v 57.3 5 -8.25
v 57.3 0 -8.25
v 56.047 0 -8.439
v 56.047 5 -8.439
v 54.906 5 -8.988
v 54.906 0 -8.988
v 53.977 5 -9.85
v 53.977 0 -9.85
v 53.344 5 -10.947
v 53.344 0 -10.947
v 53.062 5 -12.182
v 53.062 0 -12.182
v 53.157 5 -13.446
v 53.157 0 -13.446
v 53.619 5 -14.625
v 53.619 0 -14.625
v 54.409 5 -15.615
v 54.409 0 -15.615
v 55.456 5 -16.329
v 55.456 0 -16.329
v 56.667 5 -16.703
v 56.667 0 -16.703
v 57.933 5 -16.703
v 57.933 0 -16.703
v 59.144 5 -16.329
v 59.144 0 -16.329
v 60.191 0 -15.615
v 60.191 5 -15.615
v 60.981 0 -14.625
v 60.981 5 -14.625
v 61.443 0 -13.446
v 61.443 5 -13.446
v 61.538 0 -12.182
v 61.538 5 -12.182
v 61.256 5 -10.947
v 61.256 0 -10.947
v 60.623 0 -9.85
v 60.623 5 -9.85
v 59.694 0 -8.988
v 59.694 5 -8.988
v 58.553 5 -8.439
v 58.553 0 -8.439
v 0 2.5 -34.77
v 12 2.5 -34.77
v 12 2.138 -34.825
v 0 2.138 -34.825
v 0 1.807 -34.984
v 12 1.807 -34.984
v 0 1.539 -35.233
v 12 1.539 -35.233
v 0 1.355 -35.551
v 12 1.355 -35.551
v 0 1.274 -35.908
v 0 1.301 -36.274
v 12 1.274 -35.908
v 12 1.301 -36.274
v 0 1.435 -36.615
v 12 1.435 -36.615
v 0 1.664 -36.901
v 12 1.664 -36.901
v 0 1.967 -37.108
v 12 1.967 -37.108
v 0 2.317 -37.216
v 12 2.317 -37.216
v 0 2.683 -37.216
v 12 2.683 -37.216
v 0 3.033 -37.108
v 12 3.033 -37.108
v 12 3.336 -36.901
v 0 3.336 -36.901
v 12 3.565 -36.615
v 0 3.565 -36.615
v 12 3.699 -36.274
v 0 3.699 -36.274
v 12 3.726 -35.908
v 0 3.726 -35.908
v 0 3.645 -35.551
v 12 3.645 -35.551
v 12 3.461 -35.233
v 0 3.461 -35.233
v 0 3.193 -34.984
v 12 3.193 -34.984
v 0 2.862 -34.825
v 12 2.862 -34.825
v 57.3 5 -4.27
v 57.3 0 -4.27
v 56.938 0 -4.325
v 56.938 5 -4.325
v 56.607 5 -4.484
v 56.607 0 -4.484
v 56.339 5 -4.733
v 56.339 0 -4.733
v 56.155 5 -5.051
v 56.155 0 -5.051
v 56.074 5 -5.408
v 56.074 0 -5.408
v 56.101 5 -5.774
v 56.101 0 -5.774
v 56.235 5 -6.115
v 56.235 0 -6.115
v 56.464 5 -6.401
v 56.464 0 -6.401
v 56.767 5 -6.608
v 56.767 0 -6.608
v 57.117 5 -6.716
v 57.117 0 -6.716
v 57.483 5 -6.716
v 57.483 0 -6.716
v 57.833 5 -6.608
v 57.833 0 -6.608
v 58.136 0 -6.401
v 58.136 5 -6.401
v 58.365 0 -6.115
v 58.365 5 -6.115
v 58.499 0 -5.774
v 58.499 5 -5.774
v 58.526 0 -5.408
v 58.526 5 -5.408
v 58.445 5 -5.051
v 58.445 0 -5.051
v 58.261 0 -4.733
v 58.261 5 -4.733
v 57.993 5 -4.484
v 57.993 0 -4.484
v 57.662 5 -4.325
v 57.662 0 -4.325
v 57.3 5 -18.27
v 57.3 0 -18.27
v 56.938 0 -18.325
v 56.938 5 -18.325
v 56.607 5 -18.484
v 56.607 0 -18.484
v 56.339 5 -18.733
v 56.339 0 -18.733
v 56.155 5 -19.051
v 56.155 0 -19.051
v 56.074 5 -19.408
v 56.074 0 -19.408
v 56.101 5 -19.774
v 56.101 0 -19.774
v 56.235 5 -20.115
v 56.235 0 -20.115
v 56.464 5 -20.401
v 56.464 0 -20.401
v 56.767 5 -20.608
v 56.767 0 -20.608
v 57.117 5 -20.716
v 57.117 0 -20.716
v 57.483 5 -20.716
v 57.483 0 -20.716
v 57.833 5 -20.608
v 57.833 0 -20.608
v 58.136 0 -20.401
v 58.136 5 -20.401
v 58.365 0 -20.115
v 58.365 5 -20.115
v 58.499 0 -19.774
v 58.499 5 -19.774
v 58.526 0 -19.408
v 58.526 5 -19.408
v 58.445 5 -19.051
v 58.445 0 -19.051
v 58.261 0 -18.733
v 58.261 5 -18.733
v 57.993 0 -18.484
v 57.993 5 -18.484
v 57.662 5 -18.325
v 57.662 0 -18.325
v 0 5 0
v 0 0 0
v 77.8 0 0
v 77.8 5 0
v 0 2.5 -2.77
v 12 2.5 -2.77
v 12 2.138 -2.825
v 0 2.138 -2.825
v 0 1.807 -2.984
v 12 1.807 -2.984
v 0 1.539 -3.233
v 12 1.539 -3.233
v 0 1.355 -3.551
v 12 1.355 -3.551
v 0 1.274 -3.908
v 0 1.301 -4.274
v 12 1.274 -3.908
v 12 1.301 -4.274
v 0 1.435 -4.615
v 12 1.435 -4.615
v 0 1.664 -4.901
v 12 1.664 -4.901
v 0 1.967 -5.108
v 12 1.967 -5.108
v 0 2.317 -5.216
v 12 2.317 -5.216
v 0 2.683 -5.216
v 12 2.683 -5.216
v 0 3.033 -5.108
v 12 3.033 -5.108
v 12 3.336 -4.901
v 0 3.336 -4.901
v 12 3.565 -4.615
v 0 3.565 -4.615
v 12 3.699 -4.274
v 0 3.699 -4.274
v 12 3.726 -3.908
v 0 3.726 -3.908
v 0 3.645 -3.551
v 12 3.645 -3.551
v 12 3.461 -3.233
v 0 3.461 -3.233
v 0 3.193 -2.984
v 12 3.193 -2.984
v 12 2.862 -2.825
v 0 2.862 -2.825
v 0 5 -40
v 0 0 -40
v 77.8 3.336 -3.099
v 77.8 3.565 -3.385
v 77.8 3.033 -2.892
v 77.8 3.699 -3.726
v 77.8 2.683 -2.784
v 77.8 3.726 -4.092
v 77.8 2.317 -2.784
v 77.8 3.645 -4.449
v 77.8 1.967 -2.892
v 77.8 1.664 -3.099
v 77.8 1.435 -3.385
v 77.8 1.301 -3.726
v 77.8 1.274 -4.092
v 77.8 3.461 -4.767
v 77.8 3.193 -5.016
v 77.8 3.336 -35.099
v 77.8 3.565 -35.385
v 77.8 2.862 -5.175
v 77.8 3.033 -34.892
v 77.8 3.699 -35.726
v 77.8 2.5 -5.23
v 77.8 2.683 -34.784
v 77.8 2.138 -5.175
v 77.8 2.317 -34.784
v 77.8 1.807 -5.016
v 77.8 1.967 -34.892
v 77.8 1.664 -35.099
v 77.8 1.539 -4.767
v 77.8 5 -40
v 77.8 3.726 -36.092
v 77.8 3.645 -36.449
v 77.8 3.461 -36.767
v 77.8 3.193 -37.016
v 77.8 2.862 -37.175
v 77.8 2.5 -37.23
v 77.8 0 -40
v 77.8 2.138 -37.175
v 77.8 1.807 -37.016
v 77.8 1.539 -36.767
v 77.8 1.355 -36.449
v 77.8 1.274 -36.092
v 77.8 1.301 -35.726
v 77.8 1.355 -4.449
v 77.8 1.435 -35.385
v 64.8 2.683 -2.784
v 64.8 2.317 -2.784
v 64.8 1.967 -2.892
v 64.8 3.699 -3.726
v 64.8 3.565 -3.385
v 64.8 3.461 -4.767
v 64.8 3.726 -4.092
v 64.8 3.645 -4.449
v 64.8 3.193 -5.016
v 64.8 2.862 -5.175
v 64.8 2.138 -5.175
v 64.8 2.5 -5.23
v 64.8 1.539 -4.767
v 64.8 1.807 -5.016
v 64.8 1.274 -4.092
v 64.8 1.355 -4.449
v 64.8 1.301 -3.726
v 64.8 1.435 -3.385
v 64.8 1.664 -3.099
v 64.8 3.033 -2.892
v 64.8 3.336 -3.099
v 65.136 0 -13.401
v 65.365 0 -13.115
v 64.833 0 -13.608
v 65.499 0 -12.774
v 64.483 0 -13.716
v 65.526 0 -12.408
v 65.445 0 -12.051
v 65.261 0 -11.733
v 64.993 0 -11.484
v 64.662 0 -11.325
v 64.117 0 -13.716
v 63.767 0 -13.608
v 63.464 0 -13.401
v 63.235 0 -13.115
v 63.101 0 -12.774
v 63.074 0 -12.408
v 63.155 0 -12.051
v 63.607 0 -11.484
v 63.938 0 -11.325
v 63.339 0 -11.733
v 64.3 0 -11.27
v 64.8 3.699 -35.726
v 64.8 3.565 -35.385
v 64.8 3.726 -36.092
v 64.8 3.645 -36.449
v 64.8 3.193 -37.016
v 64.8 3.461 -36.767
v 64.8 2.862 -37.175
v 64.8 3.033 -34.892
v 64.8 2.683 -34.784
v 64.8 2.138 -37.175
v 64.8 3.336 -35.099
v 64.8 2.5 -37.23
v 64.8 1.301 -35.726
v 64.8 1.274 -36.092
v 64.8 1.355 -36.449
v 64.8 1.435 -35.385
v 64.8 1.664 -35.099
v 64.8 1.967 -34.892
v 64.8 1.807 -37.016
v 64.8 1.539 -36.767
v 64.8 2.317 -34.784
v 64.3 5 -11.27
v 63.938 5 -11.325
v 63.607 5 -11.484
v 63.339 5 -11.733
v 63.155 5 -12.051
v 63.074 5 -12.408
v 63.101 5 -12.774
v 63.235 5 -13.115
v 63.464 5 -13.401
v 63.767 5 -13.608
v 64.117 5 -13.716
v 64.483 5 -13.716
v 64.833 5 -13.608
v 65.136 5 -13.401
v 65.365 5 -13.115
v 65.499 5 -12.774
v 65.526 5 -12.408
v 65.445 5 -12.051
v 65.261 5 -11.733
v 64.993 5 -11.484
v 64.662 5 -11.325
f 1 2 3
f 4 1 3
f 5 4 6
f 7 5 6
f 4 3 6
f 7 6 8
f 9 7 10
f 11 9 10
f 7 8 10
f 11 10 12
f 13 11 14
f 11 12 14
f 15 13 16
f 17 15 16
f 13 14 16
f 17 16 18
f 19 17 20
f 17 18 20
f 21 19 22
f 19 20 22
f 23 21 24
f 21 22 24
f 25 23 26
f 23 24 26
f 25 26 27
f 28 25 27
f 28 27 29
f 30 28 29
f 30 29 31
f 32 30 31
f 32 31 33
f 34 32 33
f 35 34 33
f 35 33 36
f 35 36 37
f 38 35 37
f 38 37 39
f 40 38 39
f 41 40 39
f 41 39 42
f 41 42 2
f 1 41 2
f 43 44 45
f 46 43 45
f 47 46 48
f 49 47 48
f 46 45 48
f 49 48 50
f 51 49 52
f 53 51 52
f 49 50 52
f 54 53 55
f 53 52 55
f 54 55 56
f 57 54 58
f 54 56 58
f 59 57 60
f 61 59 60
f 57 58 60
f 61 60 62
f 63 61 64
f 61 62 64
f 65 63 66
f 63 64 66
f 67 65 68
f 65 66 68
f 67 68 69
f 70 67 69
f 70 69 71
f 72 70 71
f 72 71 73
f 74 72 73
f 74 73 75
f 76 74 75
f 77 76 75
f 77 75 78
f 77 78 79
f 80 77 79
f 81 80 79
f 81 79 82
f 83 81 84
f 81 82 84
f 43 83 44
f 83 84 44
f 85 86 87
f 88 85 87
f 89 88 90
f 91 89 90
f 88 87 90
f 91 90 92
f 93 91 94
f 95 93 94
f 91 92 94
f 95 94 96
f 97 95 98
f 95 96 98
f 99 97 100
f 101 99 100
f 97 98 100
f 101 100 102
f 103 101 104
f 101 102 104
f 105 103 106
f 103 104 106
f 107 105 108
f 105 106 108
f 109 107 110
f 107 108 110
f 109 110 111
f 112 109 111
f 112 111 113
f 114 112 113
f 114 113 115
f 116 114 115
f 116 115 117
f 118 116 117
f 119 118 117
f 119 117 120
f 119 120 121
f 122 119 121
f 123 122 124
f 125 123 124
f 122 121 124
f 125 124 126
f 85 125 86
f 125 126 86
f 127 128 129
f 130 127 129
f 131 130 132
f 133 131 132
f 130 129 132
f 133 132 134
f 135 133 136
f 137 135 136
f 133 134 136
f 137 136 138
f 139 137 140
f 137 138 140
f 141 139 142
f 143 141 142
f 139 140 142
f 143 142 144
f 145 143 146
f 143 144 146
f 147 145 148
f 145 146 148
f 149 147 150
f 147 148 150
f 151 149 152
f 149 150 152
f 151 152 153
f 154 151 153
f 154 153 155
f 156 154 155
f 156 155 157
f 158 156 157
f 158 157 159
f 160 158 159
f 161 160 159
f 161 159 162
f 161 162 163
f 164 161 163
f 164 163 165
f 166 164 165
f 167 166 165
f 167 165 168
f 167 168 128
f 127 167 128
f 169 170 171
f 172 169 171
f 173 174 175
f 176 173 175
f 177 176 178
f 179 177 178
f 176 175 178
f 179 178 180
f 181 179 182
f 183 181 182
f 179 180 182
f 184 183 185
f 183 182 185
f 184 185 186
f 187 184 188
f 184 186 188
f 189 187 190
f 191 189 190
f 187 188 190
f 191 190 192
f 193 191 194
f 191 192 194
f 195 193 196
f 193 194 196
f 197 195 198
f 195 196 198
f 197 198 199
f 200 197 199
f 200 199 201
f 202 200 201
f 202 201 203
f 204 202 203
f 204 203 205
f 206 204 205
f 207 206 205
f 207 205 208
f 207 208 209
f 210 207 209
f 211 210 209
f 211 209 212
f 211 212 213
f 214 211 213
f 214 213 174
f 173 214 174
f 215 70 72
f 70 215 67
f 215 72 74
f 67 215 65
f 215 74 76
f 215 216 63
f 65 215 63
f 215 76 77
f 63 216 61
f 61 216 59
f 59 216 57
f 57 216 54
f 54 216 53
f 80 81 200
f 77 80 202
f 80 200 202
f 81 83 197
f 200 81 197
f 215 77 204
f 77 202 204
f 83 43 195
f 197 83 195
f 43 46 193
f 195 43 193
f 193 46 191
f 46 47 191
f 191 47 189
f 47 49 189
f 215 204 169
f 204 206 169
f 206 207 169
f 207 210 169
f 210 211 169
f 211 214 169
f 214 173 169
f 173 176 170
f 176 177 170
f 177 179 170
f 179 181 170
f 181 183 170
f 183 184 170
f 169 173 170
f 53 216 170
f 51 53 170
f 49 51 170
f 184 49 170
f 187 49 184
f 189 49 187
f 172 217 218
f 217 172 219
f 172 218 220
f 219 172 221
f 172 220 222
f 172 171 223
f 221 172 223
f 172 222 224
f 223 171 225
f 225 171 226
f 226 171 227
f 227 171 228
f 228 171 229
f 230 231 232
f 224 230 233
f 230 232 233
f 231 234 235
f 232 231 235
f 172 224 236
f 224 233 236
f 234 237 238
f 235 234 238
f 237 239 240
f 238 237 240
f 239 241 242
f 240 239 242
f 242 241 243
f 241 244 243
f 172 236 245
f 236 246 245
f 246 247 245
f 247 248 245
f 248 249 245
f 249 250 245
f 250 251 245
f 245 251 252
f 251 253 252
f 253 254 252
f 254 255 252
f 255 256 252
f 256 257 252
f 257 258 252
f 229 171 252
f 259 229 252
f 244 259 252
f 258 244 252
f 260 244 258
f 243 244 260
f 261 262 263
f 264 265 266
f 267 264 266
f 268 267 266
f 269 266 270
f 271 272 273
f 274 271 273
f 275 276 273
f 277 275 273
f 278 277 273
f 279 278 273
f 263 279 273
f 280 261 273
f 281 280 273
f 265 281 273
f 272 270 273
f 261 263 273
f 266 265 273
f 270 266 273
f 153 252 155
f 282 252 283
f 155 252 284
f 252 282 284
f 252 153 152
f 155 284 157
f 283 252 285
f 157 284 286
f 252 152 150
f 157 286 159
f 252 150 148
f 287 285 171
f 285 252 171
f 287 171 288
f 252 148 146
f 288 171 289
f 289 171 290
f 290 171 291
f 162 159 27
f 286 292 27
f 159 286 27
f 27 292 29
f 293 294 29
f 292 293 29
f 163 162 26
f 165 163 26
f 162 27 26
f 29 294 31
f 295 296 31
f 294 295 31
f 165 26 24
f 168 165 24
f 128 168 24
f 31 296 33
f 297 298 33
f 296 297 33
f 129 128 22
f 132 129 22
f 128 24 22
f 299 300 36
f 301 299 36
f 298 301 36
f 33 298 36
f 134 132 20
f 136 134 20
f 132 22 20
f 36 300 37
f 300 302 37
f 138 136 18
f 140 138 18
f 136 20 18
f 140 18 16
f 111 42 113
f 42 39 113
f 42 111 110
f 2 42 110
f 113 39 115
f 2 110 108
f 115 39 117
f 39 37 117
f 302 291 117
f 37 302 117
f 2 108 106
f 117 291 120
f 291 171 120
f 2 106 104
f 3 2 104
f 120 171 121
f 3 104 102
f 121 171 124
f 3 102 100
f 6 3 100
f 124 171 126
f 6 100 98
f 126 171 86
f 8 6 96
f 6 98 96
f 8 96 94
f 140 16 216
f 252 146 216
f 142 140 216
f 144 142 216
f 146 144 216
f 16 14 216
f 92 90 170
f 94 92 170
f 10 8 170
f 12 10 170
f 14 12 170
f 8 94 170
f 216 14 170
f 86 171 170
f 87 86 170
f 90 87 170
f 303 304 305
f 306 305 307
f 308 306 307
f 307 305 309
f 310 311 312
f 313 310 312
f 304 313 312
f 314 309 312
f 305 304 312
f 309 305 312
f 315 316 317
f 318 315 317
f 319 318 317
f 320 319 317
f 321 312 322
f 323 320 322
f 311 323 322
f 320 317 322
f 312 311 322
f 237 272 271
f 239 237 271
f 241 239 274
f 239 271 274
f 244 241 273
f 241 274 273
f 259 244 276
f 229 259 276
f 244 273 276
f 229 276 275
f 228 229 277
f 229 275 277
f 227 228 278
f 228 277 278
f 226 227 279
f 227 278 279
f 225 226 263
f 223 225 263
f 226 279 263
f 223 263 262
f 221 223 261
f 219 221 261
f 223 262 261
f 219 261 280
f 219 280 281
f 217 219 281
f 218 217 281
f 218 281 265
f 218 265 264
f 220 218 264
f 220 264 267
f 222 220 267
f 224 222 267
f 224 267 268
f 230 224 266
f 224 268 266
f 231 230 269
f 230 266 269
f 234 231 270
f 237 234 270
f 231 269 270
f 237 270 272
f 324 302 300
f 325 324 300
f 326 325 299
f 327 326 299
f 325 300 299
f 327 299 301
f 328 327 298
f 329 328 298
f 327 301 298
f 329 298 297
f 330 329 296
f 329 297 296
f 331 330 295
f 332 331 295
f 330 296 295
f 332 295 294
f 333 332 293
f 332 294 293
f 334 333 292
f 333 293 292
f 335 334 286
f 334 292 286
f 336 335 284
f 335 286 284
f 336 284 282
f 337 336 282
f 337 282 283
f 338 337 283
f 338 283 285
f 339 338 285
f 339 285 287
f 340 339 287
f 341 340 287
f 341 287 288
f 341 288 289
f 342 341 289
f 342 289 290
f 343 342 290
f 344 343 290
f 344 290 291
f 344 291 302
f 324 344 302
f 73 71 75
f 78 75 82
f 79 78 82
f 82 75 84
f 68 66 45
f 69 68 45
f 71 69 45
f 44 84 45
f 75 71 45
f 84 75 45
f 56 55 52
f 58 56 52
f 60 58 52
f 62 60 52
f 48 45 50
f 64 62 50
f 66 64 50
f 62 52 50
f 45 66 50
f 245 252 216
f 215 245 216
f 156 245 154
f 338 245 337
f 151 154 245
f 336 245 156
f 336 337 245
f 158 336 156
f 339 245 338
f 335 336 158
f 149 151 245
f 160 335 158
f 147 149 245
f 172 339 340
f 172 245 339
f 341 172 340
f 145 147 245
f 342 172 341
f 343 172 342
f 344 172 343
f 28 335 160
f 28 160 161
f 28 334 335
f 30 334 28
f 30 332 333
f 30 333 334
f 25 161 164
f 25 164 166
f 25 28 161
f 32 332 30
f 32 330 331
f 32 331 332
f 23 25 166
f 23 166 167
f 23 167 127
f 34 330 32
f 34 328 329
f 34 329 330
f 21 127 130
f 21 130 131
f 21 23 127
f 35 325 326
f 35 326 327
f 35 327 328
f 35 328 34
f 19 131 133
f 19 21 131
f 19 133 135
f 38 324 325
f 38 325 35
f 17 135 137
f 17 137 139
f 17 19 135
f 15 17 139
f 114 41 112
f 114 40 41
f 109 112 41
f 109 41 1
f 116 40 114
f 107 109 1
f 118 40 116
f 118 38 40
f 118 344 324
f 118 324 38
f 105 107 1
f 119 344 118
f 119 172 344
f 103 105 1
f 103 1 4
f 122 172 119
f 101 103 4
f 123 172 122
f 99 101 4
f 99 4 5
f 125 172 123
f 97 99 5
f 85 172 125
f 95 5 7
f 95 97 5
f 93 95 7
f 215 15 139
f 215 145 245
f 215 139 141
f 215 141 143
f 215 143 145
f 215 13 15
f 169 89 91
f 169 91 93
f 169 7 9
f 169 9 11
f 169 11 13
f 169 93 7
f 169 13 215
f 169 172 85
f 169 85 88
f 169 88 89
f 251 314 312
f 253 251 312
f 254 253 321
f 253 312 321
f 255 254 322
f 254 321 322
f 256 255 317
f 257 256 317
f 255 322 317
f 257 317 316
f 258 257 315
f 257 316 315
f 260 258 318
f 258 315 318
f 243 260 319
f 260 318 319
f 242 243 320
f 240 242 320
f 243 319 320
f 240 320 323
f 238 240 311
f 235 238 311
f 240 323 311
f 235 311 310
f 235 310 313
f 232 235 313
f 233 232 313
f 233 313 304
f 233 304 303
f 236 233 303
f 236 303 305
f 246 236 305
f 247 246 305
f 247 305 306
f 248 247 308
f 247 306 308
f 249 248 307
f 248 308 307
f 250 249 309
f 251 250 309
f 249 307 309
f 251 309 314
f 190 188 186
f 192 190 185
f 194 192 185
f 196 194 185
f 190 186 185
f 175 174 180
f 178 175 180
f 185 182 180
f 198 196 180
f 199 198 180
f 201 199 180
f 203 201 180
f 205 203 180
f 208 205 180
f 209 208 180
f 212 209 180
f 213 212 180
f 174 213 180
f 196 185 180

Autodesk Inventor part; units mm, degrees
ref_plane "YZ Plane" through (0, 0, 0) normal (1, 0, 0) x (0, 1, 0)
ref_plane "XZ Plane" through (0, 0, 0) normal (0, 1, 0) x (-1, 0, 0)
ref_plane "XY Plane" through (0, 0, 0) normal (0, 0, 1) x (1, 0, 0)
sketch "スケッチ2" plane through (0, 0, 0) normal (0, 1, 0) x (-1, 0, 0)
  line L0 (0, 0) -> (-77.8, 0)
  line L1 (-77.8, 0) -> (-77.8, -40)
  line L2 (-77.8, -40) -> (0, -40)
  line L3 (0, -40) -> (0, 0)
  dimension "d0" = 77.8
  dimension "d1" = 40
extrude "押し出し1" add sketch "スケッチ2" along normal blind 5
sketch "スケッチ4" plane through (0, 0, -40) normal (-1, 0, 0) x (0, 0, 1)
  line L0 (0, 0) -> (0, 5) construction
  line L1 (0, 2.5) -> (40, 2.5) construction
  line L2 (40, 0) -> (40, 5) construction
  point P0 (4, 2.5)
  point P1 (36, 2.5)
  dimension "d4" = 4
  dimension "d5" = 4
hole "穴1" at (0, 2.5, -36) at (0, 2.5, -4) direction (1, 0, 0) diameter 2.459 depth 12 thread size "M3x0.5" class "6H" standard "ISO Metric profile"
sketch "スケッチ5" plane through (77.8, 0, 0) normal (1, 0, 0) x (0, 0, -1)
  line L0 (0, 0) -> (0, 5) construction
  line L1 (0, 2.5) -> (39.9198, 2.5) construction
  circle A0 centre (4, 2.5) radius 1.2295 construction
  circle A1 centre (36, 2.5) radius 1.2295 projected
hole "穴2" at (77.8, 2.5, -4) at (77.8, 2.5, -36) direction (-1, 0, 0) diameter 2.459 depth 13 thread size "M3x0.5" class "6H" standard "ISO Metric profile"
sketch "スケッチ6" plane through (0, 5, 0) normal (0, 1, 0) x (1, 0, 0)
  line L0 (77.8, 0) -> (77.8, 40) construction
  line L1 (0, 40) -> (0, 0) construction
  line L2 (0, 0) -> (77.8, 0) construction
  point P0 (57.3, 12.5)
  dimension "d20" = 20.5
  dimension "d21" = 12.5
hole "穴3" at (57.3, 5, -12.5) direction (0, -1, 0) diameter 8.5 end through all
sketch "スケッチ7" plane through (0, 5, 0) normal (0, 1, 0) x (1, 0, 0)
  circle A0 centre (57.3, 12.5) radius 4.25 construction
  circle A1 centre (57.3, 12.5) radius 7 construction
  point P0 (0, 0)
  point P1 (64.3, 12.5)
  point P2 (57.3, 19.5)
  point P3 (57.3, 5.5)
  dimension "d29" = 14
hole "穴4" at (64.3, 5, -12.5) at (57.3, 5, -19.5) at (57.3, 5, -5.5) direction (0, -1, 0) diameter 2.459 end through all thread size "M3x0.5" class "6H" standard "ISO Metric profile"
sketch "スケッチ9" plane through (0, 5, 0) normal (0, 1, 0) x (1, 0, 0)
  circle A0 centre (57.3, 12.5) radius 4.25 construction
  line L0 (57.3, 12.5) -> (44.1485, 12.5) construction
  line L1 (50.05, 13.2) -> (53.05, 13.2)
  line L2 (53.05, 13.2) -> (53.05, 11.8)
  line L3 (53.05, 11.8) -> (50.05, 11.8)
  line L4 (50.05, 11.8) -> (50.05, 13.2)
  line L5 (50.05, 13.2) -> (53.05, 11.8) construction
  line L6 (53.05, 13.2) -> (50.05, 11.8) construction
  line L7 (53.05, 11.8) -> (53.108, 11.8)
  line L8 (53.05, 13.2) -> (53.108, 13.2)
  point P0 (0, 0)
  point P1 (51.55, 12.5)
  dimension "d41" = 3
  dimension "d42" = 1.4
  dimension "d43" = 0
properties part number "shoulder1_verticval_left_cover" material "アルミニウム 5052"
